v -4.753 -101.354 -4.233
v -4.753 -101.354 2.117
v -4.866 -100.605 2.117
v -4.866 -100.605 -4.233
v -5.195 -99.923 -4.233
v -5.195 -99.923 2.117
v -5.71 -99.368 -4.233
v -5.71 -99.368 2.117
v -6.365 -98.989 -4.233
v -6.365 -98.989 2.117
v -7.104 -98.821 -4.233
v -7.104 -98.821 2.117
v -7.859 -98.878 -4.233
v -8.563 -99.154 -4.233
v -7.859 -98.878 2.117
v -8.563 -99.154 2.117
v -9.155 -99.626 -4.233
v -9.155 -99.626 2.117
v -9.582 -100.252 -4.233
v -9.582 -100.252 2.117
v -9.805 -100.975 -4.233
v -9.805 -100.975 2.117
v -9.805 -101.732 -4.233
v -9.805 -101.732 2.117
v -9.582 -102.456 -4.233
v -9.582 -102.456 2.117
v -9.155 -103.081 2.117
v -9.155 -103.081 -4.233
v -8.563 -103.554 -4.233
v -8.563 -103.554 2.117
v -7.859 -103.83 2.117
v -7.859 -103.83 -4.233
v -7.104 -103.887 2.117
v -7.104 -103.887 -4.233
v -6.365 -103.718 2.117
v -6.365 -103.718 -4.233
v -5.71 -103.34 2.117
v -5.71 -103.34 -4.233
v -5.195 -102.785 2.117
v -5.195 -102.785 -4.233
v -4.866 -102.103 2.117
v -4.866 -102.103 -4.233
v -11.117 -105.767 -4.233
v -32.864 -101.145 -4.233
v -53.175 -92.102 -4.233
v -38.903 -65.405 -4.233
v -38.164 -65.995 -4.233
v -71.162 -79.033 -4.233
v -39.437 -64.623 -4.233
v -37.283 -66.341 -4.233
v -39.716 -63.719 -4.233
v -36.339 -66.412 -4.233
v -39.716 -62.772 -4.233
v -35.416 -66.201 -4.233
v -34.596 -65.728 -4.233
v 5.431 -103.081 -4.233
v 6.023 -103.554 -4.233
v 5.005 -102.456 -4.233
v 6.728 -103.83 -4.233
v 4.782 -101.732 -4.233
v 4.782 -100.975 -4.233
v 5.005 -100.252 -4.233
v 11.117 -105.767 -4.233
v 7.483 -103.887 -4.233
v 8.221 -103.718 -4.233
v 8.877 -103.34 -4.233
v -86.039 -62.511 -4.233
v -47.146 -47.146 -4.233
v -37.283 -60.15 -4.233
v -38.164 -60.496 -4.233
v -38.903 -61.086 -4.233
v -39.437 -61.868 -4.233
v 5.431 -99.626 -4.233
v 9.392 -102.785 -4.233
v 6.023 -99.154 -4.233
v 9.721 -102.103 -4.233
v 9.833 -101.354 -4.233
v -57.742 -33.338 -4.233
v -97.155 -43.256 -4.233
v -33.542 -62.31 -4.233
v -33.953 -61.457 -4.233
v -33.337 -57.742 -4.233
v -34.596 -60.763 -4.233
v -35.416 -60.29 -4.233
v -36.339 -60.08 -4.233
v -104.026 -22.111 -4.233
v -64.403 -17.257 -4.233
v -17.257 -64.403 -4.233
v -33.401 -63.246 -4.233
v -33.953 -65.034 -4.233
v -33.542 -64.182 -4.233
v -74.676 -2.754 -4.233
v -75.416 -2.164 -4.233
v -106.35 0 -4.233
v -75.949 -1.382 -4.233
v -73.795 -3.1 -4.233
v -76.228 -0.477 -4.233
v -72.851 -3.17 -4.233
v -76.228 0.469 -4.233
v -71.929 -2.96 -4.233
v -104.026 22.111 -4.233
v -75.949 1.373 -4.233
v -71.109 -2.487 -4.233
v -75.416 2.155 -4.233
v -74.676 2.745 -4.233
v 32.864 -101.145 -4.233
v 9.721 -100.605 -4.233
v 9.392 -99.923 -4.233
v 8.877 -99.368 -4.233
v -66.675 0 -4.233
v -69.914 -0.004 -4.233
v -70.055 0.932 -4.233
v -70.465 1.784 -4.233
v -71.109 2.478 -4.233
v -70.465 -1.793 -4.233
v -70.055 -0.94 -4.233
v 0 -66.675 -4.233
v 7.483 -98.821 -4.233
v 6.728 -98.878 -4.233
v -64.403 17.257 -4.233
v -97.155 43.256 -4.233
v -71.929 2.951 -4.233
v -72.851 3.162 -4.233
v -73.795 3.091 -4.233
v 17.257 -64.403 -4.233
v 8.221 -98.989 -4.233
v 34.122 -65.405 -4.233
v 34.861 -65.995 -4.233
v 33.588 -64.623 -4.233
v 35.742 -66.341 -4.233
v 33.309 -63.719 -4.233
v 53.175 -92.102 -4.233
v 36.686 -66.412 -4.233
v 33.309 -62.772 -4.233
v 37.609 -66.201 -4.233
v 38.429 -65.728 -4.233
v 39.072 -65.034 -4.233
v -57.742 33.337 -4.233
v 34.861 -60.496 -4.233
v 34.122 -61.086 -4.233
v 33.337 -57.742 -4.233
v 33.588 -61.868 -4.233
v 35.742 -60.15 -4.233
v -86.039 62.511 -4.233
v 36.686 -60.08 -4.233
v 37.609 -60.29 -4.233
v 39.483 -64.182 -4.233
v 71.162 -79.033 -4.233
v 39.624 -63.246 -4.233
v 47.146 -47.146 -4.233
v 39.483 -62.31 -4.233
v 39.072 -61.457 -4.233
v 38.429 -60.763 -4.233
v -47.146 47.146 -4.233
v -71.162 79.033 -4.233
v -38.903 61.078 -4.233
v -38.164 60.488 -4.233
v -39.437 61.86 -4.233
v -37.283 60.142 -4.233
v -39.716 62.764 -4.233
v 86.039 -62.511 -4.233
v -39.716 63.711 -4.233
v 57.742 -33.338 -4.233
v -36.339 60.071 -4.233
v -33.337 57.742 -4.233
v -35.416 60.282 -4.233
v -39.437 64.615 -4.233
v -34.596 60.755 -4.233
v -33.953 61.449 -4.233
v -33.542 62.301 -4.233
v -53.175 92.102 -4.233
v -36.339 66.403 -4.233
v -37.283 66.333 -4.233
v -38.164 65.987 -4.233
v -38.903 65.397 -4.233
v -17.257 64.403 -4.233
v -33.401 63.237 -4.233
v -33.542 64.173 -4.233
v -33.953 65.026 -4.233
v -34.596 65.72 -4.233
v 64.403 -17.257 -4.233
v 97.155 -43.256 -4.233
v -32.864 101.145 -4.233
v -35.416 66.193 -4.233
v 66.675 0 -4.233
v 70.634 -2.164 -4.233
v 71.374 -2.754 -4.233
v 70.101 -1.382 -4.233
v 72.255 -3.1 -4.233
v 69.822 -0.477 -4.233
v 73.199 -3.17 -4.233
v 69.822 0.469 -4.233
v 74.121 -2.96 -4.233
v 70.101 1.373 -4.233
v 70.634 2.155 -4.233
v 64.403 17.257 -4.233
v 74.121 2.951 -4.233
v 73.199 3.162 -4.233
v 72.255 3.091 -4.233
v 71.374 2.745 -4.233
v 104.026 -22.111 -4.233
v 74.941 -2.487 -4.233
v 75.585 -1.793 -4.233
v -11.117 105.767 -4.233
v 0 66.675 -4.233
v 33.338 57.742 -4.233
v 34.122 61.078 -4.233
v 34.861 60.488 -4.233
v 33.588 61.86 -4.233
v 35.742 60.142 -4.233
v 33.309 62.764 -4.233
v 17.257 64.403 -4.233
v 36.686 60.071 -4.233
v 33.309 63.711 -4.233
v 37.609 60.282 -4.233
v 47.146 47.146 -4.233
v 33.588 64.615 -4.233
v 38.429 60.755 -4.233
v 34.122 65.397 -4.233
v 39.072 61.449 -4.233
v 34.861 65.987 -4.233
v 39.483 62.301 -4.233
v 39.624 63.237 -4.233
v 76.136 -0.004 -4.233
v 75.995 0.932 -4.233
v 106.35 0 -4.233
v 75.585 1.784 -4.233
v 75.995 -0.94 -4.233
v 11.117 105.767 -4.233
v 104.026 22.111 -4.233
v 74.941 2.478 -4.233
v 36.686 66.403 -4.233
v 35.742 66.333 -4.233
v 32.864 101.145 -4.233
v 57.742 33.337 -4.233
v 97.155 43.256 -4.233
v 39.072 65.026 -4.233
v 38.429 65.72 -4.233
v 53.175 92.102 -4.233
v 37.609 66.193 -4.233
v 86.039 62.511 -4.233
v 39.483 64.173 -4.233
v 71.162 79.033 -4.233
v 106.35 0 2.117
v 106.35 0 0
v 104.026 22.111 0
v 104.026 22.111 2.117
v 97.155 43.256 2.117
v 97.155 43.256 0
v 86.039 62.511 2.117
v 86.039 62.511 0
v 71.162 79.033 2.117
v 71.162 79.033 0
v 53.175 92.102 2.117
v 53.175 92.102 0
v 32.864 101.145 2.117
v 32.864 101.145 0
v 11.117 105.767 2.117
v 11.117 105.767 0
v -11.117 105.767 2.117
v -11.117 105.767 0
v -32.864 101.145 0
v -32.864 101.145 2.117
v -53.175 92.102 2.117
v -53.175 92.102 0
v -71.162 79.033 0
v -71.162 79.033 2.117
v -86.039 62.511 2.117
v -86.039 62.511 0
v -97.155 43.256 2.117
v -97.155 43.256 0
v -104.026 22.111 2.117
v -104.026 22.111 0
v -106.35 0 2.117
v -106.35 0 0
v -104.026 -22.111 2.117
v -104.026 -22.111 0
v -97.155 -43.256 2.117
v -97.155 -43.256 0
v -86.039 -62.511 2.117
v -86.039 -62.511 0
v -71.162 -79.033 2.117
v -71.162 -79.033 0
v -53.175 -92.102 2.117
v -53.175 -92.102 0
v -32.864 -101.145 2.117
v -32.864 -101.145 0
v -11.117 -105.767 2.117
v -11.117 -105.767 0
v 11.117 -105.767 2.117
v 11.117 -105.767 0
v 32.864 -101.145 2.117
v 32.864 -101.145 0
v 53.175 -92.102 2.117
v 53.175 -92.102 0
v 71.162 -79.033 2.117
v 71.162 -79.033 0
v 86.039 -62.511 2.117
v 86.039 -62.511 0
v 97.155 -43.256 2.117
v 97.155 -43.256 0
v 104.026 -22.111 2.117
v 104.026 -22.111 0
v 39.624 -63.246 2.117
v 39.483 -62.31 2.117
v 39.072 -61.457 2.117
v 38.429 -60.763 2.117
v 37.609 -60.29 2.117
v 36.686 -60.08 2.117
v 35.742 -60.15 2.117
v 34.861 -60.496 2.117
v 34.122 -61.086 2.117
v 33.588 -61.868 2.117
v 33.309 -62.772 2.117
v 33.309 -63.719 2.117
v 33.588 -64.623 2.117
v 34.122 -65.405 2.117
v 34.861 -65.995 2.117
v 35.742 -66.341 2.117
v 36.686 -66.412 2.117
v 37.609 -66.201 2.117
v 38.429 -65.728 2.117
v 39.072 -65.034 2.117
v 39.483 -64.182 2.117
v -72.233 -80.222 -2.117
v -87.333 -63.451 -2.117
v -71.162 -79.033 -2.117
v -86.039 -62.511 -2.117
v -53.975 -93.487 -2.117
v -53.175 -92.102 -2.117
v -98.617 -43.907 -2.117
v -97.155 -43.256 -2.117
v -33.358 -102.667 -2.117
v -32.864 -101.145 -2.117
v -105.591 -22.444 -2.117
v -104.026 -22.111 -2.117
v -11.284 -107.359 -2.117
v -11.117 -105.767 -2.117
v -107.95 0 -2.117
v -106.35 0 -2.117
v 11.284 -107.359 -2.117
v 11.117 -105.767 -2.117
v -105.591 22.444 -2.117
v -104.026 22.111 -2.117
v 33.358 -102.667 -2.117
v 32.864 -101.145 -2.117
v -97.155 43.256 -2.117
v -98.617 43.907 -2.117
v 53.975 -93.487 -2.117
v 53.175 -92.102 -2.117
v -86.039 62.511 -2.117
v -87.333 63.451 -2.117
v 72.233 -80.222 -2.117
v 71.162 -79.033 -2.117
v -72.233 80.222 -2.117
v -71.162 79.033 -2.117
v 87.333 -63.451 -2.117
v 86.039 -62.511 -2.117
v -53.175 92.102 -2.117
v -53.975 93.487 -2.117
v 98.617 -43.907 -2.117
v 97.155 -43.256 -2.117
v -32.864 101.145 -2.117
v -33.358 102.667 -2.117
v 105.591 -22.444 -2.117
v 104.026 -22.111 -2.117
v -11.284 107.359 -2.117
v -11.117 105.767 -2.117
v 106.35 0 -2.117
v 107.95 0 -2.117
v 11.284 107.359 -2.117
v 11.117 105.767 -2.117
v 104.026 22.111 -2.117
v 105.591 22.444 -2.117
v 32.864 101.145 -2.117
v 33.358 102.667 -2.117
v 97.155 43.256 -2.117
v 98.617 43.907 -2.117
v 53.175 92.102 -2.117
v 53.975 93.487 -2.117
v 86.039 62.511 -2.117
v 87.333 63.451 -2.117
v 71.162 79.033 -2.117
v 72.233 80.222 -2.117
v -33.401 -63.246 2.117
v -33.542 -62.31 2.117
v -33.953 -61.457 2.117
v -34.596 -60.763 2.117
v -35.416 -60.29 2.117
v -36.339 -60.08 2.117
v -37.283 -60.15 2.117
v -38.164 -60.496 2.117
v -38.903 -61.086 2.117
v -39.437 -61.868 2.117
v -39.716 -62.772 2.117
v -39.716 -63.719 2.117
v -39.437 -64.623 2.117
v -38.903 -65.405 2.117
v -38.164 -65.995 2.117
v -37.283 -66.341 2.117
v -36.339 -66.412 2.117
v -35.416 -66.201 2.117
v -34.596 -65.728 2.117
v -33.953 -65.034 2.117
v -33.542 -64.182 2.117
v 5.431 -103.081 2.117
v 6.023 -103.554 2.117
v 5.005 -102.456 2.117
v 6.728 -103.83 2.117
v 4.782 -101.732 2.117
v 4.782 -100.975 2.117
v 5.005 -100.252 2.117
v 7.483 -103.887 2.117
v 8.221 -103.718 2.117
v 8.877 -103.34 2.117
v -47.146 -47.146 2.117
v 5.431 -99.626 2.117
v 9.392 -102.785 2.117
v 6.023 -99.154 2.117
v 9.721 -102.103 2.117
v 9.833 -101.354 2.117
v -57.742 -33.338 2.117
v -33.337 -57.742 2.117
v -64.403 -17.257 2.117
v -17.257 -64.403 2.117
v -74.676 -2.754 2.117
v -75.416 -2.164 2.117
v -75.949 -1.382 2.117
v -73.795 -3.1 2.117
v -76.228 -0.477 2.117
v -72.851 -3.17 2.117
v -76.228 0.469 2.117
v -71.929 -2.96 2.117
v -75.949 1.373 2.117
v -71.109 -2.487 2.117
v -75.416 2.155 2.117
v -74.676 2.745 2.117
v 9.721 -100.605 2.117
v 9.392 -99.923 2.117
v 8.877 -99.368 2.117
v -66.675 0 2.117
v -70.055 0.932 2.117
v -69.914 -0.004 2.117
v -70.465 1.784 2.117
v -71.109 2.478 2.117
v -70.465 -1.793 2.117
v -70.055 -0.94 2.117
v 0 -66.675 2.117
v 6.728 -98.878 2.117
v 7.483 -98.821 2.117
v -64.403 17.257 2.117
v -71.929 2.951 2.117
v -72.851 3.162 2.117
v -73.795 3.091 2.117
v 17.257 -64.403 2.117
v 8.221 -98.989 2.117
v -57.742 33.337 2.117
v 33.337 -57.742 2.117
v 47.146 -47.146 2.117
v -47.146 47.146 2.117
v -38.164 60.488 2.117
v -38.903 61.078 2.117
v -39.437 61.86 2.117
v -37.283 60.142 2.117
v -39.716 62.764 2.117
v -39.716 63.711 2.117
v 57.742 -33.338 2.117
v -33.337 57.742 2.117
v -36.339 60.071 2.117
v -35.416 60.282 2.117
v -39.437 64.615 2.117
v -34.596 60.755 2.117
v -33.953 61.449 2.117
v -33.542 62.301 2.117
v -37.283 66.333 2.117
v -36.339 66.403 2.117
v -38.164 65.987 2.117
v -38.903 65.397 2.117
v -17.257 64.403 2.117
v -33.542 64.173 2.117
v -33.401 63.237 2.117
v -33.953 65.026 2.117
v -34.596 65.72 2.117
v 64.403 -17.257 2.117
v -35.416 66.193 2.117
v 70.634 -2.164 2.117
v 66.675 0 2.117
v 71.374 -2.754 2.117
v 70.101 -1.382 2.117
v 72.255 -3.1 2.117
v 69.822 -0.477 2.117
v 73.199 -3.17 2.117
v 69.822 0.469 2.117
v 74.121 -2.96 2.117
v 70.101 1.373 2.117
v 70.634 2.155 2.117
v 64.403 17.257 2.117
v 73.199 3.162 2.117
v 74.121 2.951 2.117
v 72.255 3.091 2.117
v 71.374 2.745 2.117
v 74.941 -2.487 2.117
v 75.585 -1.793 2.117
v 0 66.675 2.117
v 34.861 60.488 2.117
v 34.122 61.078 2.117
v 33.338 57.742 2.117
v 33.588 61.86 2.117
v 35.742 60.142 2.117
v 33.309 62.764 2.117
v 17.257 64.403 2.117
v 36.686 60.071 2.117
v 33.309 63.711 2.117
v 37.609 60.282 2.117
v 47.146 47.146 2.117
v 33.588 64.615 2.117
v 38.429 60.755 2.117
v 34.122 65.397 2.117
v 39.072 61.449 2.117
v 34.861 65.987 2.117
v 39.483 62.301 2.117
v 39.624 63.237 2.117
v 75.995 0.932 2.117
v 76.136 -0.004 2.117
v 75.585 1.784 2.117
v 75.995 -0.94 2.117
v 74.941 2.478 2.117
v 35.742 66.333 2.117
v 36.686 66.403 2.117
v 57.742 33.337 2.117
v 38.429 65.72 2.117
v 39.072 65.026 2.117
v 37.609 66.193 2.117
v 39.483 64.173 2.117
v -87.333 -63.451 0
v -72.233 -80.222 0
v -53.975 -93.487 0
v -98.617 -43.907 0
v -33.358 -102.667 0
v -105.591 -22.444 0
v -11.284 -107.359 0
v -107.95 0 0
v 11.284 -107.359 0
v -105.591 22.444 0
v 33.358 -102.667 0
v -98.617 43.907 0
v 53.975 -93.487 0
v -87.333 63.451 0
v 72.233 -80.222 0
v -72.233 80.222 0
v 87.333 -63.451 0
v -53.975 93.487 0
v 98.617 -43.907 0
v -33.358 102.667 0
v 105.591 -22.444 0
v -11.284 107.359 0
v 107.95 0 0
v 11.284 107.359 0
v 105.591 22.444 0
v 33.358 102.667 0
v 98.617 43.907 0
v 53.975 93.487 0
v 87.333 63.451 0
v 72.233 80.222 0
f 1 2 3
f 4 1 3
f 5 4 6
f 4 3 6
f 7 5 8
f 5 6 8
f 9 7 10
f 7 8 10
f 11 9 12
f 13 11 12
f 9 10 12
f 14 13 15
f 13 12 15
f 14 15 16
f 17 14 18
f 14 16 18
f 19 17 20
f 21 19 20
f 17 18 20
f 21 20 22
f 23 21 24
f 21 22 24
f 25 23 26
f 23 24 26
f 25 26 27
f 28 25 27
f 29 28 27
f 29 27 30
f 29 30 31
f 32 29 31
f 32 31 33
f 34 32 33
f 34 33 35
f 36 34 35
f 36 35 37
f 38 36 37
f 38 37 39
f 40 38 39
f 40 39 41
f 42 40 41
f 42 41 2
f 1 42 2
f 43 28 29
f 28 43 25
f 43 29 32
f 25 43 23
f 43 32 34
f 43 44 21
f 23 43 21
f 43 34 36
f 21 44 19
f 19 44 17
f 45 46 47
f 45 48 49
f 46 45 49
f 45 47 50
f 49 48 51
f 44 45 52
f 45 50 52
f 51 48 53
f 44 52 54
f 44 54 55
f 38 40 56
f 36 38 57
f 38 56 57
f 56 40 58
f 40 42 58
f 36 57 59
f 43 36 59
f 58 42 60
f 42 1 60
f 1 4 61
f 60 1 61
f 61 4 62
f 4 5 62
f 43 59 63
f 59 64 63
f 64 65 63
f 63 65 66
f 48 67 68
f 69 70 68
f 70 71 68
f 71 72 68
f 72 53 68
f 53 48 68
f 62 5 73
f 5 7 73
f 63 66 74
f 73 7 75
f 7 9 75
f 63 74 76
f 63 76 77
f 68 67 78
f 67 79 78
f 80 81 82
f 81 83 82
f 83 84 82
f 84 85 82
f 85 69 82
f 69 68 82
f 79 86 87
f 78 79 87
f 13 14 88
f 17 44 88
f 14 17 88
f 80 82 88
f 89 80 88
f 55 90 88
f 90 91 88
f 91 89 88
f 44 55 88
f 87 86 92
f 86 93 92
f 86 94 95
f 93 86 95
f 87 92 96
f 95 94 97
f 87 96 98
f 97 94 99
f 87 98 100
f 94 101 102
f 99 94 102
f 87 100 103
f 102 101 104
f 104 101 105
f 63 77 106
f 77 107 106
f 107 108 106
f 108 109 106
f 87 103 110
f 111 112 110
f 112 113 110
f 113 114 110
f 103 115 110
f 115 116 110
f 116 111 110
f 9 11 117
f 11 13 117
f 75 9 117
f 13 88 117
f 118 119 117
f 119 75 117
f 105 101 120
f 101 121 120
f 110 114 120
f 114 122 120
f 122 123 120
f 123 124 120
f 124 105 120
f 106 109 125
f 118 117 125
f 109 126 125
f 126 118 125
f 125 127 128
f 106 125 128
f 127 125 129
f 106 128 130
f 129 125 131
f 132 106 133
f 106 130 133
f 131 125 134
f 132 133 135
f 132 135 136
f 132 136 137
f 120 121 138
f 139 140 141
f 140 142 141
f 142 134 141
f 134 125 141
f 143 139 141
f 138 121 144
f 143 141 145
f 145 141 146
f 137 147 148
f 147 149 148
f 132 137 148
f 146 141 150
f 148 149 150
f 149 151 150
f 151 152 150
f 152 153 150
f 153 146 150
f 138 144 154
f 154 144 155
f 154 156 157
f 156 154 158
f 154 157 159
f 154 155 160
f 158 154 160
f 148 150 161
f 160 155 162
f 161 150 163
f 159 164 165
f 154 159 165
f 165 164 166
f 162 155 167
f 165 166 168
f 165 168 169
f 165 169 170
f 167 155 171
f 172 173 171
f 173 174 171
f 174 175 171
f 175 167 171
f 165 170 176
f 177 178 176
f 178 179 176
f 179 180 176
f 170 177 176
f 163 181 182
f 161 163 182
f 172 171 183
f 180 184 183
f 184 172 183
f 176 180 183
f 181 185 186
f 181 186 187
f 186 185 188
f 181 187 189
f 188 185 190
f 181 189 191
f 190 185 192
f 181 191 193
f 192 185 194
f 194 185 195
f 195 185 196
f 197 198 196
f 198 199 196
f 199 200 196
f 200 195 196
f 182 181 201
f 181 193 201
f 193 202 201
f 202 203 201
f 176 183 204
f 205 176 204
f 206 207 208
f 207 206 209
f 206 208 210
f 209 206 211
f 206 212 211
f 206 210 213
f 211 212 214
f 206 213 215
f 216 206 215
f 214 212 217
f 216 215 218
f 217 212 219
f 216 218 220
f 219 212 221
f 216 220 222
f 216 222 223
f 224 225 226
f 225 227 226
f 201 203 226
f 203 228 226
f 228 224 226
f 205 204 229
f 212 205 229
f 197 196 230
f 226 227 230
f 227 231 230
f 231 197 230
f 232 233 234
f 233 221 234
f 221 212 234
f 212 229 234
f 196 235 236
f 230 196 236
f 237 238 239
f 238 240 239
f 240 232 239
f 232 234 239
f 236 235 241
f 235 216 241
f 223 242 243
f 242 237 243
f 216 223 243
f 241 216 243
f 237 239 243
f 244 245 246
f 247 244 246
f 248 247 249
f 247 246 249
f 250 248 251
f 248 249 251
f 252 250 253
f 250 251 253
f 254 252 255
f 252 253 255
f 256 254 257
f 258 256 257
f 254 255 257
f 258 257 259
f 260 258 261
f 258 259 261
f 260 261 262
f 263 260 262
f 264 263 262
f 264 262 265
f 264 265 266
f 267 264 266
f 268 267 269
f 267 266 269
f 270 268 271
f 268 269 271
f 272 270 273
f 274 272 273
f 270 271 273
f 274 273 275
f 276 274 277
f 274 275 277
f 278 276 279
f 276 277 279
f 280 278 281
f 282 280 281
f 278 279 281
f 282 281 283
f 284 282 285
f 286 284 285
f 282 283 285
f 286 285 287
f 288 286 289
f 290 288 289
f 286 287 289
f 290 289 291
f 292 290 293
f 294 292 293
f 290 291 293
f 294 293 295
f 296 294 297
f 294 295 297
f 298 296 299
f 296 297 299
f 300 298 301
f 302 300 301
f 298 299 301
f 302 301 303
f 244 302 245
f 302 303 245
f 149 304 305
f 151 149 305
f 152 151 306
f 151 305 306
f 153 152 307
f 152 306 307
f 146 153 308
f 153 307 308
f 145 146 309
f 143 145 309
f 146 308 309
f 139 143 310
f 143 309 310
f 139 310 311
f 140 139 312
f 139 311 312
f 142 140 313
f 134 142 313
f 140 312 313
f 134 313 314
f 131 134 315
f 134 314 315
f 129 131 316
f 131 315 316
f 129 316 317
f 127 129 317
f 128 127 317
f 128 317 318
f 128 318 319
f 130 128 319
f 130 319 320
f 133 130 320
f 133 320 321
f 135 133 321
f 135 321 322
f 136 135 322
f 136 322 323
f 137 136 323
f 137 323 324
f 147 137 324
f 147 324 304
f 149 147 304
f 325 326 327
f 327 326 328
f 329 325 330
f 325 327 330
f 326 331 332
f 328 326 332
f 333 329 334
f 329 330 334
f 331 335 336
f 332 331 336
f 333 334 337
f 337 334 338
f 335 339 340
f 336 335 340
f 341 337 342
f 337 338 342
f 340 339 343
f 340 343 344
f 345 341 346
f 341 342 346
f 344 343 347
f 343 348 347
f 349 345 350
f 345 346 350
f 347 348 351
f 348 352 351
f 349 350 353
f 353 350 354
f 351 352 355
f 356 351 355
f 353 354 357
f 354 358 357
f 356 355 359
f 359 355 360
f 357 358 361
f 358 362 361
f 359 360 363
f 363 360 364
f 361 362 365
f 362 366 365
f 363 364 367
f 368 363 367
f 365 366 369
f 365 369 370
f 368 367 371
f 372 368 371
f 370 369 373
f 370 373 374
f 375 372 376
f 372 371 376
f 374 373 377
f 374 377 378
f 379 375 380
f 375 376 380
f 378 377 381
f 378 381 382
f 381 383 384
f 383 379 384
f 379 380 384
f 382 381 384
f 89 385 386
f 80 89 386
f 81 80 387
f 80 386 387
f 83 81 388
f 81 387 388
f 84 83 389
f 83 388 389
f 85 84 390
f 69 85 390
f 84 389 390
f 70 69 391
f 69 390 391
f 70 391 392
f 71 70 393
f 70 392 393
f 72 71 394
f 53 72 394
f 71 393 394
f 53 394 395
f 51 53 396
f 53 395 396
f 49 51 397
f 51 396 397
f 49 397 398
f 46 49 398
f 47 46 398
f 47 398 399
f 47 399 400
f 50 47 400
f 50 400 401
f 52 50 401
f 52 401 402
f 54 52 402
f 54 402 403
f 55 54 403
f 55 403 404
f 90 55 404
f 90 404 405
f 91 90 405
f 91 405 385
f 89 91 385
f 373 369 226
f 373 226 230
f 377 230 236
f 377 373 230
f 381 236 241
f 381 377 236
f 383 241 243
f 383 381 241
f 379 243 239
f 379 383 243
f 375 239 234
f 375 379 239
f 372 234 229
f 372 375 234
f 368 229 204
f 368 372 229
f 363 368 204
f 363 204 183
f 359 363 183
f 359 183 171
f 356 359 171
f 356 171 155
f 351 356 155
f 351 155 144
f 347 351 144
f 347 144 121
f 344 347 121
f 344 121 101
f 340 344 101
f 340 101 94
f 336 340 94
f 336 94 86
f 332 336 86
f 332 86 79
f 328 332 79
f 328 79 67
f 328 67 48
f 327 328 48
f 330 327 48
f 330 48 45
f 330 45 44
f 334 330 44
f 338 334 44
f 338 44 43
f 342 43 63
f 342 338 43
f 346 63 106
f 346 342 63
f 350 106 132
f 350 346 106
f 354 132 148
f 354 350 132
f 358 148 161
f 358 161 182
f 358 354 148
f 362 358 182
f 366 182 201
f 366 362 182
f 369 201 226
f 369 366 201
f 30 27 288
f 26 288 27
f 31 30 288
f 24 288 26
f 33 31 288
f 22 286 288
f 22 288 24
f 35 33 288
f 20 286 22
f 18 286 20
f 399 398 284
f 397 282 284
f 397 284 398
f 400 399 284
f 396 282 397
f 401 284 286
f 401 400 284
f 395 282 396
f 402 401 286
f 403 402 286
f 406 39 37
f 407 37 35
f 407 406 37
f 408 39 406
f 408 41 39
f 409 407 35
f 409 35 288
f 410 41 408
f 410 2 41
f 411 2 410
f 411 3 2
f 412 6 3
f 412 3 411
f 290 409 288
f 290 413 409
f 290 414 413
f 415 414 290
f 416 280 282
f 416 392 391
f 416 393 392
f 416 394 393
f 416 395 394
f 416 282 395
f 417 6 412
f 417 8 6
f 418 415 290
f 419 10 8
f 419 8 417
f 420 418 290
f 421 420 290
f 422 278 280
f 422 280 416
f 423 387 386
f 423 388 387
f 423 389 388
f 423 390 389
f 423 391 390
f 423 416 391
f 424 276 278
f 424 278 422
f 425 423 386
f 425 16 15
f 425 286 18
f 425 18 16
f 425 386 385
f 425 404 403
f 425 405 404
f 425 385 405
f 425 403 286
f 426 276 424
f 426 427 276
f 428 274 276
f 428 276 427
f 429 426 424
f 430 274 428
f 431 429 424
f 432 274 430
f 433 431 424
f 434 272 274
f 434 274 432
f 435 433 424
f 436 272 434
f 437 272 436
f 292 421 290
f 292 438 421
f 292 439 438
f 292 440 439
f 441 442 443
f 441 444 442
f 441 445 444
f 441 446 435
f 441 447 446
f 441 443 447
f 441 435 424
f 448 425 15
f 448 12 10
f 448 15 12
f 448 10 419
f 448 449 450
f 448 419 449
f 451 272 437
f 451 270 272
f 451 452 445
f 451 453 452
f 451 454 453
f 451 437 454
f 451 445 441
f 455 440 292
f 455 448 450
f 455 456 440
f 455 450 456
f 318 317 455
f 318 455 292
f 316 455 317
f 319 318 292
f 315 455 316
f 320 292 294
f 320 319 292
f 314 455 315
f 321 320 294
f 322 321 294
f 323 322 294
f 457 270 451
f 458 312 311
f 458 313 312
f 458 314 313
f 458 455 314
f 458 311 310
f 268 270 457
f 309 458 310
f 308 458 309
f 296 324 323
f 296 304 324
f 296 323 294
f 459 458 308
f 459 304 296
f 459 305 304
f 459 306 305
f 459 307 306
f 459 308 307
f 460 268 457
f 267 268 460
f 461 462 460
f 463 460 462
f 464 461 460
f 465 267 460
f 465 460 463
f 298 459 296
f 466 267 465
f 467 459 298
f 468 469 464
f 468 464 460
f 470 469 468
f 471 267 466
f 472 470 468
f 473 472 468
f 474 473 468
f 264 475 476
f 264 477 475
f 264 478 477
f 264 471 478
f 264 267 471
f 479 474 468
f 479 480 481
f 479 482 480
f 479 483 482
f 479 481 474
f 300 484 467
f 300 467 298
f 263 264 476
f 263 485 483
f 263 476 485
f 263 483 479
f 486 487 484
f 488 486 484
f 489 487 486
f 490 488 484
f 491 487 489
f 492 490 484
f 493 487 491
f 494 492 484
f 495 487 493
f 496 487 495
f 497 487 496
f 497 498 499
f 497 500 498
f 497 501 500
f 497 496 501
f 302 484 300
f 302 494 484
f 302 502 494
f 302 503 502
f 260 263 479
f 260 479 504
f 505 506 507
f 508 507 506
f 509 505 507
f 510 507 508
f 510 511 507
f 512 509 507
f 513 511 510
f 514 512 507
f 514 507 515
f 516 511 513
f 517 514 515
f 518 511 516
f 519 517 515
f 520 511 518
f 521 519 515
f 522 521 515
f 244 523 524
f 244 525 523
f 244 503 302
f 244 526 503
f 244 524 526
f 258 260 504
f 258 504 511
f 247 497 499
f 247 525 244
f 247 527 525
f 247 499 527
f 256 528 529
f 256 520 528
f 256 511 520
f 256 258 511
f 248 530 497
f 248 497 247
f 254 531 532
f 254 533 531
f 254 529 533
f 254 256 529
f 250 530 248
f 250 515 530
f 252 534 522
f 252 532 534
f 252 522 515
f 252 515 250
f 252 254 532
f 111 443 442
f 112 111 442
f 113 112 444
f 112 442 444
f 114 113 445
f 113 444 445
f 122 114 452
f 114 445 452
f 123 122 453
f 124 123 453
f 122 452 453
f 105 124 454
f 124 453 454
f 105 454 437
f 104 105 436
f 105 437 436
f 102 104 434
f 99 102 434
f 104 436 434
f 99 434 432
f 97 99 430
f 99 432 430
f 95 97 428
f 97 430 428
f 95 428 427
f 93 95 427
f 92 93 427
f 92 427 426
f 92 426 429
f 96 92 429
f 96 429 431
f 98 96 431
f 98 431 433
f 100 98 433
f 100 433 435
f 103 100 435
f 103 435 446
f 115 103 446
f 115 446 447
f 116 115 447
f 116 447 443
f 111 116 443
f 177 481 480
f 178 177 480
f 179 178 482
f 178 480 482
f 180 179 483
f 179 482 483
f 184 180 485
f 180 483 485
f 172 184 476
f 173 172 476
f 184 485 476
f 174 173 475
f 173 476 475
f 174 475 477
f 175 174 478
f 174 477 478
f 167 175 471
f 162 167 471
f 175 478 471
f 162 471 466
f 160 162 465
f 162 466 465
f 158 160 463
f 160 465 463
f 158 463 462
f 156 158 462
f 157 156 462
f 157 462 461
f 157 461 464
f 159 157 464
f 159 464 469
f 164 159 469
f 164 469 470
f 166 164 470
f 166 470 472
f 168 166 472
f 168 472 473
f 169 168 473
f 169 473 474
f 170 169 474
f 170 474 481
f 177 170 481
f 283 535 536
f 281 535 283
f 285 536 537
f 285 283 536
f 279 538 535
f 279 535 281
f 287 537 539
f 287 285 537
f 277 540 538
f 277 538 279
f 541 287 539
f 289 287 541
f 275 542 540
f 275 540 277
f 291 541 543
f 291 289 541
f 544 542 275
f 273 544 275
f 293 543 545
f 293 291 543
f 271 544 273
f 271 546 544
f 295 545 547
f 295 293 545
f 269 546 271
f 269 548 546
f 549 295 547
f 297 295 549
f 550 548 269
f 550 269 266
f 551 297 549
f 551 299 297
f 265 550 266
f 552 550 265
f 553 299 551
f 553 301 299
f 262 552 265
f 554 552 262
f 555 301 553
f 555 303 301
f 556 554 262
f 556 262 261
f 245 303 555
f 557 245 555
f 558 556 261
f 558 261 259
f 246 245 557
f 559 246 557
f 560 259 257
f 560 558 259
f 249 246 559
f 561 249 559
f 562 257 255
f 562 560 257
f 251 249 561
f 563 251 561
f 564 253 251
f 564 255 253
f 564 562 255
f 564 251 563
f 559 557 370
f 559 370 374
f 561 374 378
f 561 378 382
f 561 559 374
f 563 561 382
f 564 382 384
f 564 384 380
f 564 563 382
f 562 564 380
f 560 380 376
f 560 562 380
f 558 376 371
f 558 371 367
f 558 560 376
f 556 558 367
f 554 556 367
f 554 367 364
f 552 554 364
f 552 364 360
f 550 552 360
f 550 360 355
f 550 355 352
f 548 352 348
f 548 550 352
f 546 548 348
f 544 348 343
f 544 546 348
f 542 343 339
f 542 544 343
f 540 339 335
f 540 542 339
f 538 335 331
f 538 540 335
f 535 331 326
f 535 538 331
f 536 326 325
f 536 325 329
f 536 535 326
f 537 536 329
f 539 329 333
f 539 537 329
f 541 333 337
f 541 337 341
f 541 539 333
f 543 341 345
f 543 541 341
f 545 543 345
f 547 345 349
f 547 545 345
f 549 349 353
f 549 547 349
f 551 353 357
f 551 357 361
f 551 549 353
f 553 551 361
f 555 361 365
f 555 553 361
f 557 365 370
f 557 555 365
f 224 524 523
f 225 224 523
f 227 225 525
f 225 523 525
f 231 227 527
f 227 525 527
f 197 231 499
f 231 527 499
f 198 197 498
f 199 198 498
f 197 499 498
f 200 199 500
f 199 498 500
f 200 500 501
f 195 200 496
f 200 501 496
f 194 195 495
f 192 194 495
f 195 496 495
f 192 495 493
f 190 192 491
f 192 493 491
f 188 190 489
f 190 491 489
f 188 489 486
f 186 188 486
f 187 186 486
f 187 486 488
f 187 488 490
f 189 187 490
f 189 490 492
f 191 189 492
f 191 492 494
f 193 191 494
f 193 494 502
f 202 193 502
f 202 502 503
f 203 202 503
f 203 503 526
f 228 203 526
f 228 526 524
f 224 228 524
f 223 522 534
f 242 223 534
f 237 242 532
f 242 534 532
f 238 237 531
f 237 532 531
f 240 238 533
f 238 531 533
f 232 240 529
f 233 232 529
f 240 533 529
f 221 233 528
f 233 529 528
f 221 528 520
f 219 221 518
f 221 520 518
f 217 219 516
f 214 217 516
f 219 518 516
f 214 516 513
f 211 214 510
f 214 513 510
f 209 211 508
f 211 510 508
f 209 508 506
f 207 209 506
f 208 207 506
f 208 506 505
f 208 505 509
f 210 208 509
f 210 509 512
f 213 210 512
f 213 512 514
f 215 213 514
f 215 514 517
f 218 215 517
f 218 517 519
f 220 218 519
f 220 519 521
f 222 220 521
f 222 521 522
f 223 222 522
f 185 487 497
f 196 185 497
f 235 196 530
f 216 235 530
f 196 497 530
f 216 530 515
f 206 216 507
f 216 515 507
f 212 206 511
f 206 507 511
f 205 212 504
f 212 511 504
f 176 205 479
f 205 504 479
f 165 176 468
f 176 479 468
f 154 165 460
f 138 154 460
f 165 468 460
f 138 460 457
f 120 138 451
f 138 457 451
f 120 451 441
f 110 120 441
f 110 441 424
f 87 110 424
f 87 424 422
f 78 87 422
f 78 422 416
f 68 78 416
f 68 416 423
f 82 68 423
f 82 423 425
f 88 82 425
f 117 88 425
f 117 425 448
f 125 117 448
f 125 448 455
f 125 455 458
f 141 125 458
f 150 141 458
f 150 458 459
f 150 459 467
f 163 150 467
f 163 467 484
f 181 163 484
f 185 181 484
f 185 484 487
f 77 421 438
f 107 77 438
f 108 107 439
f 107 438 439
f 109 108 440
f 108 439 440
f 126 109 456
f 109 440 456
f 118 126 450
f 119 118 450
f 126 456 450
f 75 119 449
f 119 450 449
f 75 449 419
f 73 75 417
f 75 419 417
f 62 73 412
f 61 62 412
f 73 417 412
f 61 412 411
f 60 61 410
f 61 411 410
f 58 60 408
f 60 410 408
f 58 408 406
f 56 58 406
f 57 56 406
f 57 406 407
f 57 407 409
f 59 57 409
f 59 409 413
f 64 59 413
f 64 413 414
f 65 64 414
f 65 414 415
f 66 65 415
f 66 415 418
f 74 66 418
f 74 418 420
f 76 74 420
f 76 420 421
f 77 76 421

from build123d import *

# Parameters (mm, degrees)
F0_R      = 106.3498
F1_DEPTH  = 2.116667
F0_R_2    = 107.95
F1_FACE_R = 106.3498
F2_DEPTH  = 2.116667
F3_DEPTH  = 4.233333
F4_R      = 66.675
F5_DEPTH  = 6.351
F6_R      = 3.175
F7_DEPTH  = 25.4
F8_R      = 2.54
F9_DEPTH  = 6.351


with BuildPart() as f1:
    # F0 (on Top) → F1 (new body)
    with BuildSketch(Plane.XY):
        Circle(F0_R)
    extrude(amount=F1_DEPTH)

    # F0 (on Top) + F1_face (on face) → F2 (join)
    with BuildSketch(Plane.XY):
        Circle(F0_R_2)
        Circle(F0_R, mode=Mode.SUBTRACT)
    with BuildSketch(Plane(origin=(0, 0, 0), x_dir=(1, 0, 0), z_dir=(0, 0, -1))):
        Circle(F1_FACE_R)
    extrude(amount=-F2_DEPTH)

    # F0 (on Top) → F3 (join)
    with BuildSketch(Plane.XY):
        Circle(F0_R)
    extrude(amount=-F3_DEPTH)

    # F4 (on face) → F5 (cut, through all)
    with BuildSketch(Plane.XY.offset(2.116667)):
        Circle(F4_R)
    extrude(amount=-F5_DEPTH, mode=Mode.SUBTRACT)

    # F6 (on face) → F7 (cut)
    with BuildSketch(Plane.XY.offset(2.116667)):
        with Locations((-73.088507, -0.004187)):
            Circle(F6_R)
        with Locations((36.448993, 63.237318)):
            Circle(F6_R)
        with Locations((72.961493, -0.004187)):
            Circle(F6_R)
        with Locations((36.448993, -63.245692)):
            Circle(F6_R)
        with Locations((-36.576007, -63.245692)):
            Circle(F6_R)
        with Locations((-36.576007, 63.237318)):
            Circle(F6_R)
    extrude(amount=-F7_DEPTH, mode=Mode.SUBTRACT)

    # F8 (on face) → F9 (cut, through all)
    with BuildSketch(Plane.XY.offset(2.116667)):
        with Locations((-7.293369, -101.353851)):
            Circle(F8_R)
        with Locations((7.293369, -101.353851)):
            Circle(F8_R)
    extrude(amount=-F9_DEPTH, mode=Mode.SUBTRACT)


solid = f1.part
